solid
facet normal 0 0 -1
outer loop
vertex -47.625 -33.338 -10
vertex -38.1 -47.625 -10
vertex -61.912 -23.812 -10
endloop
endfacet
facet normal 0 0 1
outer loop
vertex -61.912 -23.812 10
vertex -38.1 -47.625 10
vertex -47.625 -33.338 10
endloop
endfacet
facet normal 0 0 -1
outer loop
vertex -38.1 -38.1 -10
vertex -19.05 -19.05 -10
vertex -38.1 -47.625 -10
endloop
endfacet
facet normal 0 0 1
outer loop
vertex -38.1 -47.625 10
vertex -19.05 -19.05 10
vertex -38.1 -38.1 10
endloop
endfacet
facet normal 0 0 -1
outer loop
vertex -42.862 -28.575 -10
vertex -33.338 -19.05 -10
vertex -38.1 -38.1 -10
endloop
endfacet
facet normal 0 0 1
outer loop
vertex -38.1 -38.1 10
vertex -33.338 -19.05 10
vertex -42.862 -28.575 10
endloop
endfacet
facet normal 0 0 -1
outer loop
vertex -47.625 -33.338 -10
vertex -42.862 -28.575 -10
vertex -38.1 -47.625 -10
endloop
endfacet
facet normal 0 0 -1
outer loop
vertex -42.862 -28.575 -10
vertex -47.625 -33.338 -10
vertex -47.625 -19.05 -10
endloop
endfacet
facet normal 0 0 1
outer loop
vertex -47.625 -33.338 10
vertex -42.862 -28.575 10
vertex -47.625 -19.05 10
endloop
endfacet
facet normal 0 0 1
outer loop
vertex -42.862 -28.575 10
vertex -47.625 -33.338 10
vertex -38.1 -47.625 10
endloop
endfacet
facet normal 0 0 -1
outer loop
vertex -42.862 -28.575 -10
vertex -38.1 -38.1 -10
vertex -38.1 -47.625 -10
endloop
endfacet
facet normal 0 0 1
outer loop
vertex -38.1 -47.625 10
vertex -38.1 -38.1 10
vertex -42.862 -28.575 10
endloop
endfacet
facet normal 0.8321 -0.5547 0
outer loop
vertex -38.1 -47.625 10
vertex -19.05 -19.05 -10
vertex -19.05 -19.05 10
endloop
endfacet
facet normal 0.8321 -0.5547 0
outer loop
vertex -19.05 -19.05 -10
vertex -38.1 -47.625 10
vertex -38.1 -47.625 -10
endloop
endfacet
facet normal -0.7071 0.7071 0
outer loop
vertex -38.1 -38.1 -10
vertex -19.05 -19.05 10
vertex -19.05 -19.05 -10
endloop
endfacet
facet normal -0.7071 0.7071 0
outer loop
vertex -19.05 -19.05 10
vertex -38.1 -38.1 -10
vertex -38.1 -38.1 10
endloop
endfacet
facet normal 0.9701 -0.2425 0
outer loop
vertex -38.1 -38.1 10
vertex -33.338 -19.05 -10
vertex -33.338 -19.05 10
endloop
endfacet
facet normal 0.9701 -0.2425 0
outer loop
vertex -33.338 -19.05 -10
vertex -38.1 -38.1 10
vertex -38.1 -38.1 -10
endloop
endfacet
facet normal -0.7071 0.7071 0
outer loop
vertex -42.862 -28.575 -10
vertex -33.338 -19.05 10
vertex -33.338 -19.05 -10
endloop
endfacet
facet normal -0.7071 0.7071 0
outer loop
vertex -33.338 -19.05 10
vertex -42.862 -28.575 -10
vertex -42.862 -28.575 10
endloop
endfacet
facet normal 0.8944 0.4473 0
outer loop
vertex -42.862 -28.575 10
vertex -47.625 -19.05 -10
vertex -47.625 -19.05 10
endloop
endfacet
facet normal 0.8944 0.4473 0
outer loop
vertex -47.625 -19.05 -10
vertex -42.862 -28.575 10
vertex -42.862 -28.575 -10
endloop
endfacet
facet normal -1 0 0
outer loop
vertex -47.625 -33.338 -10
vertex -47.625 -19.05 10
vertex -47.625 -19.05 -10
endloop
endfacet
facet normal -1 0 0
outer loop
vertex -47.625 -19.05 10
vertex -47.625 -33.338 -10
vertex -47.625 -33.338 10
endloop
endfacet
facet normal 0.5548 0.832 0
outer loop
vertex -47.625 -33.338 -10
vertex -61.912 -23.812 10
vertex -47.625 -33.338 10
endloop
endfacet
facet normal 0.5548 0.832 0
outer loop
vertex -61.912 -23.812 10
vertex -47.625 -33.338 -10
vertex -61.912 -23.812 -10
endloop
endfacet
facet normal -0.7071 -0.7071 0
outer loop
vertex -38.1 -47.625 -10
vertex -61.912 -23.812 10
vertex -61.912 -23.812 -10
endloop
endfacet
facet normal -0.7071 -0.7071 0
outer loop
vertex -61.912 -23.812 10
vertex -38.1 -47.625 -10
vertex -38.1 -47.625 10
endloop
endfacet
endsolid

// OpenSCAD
polyhedron(
    points=[
    [-38.1, -47.625, -10],
    [-19.05, -19.05, -10],
    [-38.1, -38.1, -10],
    [-33.3375, -19.05, -10],
    [-42.8625, -28.575, -10],
    [-47.625, -19.05, -10],
    [-47.625, -33.3375, -10],
    [-61.9125, -23.8125, -10],
    [-38.1, -47.625, 10],
    [-19.05, -19.05, 10],
    [-38.1, -38.1, 10],
    [-33.3375, -19.05, 10],
    [-42.8625, -28.575, 10],
    [-47.625, -19.05, 10],
    [-47.625, -33.3375, 10],
    [-61.9125, -23.8125, 10],
    ],
    faces=[
        [7,0,6],
        [14,8,15],
        [0,1,2],
        [10,9,8],
        [2,3,4],
        [12,11,10],
        [6,0,4,5],
        [13,12,8,14],
        [0,2,4],
        [12,10,8],
        [0,8,9,1],
        [1,9,10,2],
        [2,10,11,3],
        [3,11,12,4],
        [4,12,13,5],
        [5,13,14,6],
        [6,14,15,7],
        [7,15,8,0],
    ]
);
